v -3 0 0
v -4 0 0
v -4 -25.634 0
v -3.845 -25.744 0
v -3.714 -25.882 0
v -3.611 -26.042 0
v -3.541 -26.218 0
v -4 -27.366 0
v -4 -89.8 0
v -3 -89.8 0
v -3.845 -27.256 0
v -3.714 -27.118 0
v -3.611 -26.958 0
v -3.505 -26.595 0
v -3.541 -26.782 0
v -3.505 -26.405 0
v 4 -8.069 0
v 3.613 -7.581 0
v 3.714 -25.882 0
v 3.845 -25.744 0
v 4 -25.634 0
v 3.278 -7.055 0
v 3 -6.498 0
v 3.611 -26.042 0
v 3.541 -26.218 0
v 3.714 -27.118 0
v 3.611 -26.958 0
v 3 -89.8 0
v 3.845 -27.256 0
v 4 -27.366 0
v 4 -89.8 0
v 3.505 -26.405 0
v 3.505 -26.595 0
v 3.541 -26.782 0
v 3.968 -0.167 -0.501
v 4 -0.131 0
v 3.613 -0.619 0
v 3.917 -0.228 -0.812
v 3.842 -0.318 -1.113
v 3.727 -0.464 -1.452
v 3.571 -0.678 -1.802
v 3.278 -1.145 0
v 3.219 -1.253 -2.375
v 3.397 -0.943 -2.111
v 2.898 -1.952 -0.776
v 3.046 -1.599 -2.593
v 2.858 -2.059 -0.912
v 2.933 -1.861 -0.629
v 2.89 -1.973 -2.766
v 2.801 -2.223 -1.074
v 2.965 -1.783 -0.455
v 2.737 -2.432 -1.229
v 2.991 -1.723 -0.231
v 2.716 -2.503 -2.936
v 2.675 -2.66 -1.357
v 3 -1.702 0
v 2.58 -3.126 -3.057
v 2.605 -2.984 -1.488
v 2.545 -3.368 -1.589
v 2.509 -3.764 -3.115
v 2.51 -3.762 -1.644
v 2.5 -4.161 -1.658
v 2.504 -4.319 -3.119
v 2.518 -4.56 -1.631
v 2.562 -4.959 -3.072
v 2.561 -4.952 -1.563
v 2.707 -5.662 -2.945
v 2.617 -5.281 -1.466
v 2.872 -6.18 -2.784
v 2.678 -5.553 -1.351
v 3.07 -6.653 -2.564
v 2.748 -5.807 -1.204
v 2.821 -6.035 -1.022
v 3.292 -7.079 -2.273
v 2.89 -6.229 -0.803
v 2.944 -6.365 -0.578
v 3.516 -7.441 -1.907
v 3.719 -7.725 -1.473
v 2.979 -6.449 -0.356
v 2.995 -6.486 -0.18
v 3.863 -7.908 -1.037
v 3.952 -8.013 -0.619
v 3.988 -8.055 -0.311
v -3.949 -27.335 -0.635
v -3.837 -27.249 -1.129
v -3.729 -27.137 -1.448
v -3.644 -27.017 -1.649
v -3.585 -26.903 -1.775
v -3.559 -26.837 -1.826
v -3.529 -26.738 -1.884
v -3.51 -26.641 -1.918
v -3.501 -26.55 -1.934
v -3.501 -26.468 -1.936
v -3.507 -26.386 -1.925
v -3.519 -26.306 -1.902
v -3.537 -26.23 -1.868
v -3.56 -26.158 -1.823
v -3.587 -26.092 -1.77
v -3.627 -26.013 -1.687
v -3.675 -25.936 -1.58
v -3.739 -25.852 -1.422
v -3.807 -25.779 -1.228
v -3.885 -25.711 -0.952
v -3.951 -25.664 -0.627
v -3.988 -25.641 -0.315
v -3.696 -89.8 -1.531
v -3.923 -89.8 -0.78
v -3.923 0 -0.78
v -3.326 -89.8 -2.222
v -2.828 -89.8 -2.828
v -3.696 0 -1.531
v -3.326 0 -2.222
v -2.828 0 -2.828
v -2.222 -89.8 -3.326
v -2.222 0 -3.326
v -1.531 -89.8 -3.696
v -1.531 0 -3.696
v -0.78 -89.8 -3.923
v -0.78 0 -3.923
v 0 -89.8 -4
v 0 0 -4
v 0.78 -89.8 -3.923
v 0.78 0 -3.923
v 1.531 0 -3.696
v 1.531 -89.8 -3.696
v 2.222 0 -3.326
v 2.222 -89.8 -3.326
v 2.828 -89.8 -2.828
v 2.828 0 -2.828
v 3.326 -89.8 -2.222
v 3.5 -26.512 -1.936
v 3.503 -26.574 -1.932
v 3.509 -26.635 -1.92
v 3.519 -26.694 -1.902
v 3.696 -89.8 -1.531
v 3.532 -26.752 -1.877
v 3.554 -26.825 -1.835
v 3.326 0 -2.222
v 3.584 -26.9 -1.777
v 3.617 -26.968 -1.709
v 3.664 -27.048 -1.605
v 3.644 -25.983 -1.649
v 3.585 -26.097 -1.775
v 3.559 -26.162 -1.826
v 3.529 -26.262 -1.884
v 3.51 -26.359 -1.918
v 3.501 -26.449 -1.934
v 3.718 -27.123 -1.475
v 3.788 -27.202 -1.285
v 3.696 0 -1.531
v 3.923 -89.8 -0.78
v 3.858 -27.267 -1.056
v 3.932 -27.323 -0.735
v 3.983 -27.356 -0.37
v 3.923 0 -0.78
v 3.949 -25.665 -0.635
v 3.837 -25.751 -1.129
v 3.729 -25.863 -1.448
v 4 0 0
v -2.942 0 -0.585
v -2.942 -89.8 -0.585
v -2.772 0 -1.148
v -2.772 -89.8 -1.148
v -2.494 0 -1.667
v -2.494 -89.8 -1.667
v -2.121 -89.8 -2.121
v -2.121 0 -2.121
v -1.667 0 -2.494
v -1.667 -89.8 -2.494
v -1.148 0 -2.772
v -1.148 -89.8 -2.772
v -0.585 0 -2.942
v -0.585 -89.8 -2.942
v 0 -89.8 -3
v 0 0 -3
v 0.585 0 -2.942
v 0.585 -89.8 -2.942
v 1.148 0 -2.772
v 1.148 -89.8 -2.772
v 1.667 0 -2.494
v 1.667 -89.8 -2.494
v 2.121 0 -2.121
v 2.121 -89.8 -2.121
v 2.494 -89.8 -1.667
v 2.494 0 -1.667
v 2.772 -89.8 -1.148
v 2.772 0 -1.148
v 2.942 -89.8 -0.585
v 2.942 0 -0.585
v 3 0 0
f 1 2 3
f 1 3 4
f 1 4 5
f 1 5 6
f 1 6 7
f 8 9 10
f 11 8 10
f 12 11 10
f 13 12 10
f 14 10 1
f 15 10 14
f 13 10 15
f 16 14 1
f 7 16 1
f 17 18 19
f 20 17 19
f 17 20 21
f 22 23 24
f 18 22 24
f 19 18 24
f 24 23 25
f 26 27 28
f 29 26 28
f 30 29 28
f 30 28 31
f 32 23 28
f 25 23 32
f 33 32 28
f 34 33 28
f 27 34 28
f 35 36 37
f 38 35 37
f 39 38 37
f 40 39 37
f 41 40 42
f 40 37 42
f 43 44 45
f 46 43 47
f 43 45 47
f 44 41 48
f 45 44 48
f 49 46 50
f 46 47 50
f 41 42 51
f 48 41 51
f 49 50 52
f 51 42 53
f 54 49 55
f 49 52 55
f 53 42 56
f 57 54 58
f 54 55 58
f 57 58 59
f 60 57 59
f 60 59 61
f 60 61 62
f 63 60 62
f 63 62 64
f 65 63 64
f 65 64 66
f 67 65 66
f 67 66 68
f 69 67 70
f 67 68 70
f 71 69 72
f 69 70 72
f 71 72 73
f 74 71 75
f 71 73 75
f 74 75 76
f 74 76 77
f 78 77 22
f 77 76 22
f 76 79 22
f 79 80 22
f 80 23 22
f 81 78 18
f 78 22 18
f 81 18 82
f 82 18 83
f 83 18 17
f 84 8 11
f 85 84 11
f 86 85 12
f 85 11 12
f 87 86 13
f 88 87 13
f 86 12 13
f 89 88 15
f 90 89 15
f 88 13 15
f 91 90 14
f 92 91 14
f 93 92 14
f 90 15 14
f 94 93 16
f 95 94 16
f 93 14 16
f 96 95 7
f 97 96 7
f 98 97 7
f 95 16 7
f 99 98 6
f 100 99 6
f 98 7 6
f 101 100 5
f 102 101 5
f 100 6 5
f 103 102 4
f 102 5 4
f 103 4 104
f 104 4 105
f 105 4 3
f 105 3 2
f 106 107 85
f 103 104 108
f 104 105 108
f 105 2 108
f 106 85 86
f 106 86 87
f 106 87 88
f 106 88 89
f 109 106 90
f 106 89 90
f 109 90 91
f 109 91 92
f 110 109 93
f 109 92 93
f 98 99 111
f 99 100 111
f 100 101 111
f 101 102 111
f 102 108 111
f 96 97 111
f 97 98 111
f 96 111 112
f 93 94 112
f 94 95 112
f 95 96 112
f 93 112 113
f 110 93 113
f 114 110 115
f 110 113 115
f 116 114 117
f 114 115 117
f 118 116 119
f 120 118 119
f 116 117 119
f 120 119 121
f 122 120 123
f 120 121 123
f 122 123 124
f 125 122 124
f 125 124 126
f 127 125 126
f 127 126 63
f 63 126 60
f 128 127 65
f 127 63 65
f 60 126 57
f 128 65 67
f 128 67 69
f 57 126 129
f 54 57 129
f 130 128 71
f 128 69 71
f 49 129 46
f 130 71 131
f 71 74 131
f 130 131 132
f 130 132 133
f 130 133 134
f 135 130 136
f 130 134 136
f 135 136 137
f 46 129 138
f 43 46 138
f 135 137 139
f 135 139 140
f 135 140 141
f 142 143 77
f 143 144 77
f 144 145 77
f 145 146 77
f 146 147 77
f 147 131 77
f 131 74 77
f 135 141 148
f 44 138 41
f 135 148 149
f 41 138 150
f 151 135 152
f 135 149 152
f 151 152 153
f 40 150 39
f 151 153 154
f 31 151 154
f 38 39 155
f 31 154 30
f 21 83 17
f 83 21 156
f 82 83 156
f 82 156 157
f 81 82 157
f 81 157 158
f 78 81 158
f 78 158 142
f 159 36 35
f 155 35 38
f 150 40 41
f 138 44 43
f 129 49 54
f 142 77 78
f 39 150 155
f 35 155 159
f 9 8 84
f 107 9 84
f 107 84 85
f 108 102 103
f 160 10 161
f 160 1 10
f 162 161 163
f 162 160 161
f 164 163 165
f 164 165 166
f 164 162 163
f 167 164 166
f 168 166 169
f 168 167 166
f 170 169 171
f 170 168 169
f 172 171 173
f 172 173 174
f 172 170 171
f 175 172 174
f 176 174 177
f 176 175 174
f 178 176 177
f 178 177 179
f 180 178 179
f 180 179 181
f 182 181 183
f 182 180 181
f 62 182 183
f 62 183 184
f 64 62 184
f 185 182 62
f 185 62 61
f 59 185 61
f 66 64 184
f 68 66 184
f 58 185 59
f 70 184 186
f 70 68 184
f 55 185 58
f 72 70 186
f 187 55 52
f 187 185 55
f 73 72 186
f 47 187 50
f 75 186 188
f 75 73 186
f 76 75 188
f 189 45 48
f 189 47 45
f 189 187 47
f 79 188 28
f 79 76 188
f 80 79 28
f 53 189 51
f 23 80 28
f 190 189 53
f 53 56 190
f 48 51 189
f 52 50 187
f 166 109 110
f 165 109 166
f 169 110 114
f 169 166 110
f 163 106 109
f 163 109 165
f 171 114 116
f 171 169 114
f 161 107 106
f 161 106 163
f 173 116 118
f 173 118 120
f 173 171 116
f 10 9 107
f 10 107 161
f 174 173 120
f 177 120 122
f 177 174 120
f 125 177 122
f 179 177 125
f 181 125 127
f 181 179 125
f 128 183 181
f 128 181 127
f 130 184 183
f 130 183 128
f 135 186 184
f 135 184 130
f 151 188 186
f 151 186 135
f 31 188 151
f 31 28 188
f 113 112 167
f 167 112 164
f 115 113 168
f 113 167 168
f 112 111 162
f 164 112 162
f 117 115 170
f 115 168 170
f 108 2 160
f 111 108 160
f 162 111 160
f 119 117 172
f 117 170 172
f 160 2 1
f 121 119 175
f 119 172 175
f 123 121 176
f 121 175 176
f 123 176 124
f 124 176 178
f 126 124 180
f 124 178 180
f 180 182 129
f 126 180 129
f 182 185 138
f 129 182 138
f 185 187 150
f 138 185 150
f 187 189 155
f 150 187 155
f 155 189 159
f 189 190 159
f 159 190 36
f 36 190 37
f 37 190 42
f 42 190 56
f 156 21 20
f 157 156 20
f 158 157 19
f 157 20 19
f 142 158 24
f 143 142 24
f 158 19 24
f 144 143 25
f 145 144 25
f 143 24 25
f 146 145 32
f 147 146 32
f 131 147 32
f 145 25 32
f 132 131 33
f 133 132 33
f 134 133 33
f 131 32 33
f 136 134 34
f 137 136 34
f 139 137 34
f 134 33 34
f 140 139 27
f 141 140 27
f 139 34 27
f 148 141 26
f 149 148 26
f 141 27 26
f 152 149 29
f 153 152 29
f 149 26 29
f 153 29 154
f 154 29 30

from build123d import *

# Parameters (mm, degrees)
F0_R          = 4
F0_R_2        = 3
F1_DEPTH      = 89.8
F3_DEPTH      = 96.4
F4_R          = 6
F5_DEPTH      = 25
F5_DEPTH_BACK = 25
F6_R          = 1
F7_DEPTH      = 25
F7_DEPTH_BACK = 25


with BuildPart() as f1:
    # F0 (on Front) → F1 (new body)
    with BuildSketch(Plane.XZ):
        Circle(F0_R)
        Circle(F0_R_2, mode=Mode.SUBTRACT)
    extrude(amount=F1_DEPTH)

    # F2 (on face) → F3 (cut)
    with BuildSketch(Plane.XZ.offset(89.8)):
        Polygon((-5.919513, 0), (0, 0), (6.079678, 0), (6.079678, 7.445201), (-5.919513, 7.445201), align=None)
    extrude(amount=-F3_DEPTH, mode=Mode.SUBTRACT)

    # F4 (on Top) → F5 (cut, two sides)
    with BuildSketch(Plane.XY) as f5_sk:
        with Locations((8.5, -4.1)):
            Circle(F4_R)
    extrude(amount=-F5_DEPTH, mode=Mode.SUBTRACT)
    extrude(f5_sk.sketch, amount=-F5_DEPTH_BACK, mode=Mode.SUBTRACT)

    # F6 (on face) → F7 (cut, two sides)
    with BuildSketch(Plane.XY) as f7_sk:
        with Locations((4.5, -26.5)):
            Circle(F6_R)
        with Locations((-4.5, -26.5)):
            Circle(F6_R)
    extrude(amount=-F7_DEPTH, mode=Mode.SUBTRACT)
    extrude(f7_sk.sketch, amount=-F7_DEPTH_BACK, mode=Mode.SUBTRACT)


solid = f1.part
